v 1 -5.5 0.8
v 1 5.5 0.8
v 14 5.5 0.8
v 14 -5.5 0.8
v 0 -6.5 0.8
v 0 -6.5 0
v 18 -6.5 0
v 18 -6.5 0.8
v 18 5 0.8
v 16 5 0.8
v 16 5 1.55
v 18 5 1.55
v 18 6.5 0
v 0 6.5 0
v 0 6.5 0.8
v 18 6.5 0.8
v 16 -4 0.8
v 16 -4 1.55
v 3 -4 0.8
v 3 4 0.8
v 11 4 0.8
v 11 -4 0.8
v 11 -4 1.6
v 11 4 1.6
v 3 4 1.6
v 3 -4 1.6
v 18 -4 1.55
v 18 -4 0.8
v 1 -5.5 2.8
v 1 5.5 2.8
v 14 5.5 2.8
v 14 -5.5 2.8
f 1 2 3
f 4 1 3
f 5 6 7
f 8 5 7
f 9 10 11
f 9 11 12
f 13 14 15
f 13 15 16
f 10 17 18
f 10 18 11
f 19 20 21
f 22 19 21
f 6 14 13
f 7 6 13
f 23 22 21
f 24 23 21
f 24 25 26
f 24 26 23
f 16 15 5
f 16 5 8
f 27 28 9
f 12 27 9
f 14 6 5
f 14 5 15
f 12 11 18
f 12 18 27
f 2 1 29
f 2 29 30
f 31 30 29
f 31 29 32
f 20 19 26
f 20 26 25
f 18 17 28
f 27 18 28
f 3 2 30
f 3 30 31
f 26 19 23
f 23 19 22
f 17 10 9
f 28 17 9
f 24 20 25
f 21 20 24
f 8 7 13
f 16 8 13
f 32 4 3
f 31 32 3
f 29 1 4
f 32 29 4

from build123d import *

# Parameters (mm, degrees)
BOX_W        = 18
BOX_H        = 13
BOX_DEPTH    = 0.8
BOX001_W     = 13
BOX001_H     = 11
BOX001_DEPTH = 2
BOX002_W     = 2
BOX002_H     = 9
BOX002_DEPTH = 0.75
BOX003_W     = 8
BOX003_H     = 8
BOX003_DEPTH = 0.8


with BuildPart() as pcb:
    # Box → Box (new body)
    with BuildSketch(Plane(origin=(0, -6.5, 0), x_dir=(1, 0, 0), z_dir=(0, 0, 1))):
        with Locations((9, 6.5)):
            Rectangle(BOX_W, BOX_H)
    extrude(amount=BOX_DEPTH)


with BuildPart() as shield:
    # Box001 → Box001 (new body)
    with BuildSketch(Plane(origin=(1, -5.5, 0.8), x_dir=(1, 0, 0), z_dir=(0, 0, 1))):
        with Locations((6.5, 5.5)):
            Rectangle(BOX001_W, BOX001_H)
    extrude(amount=BOX001_DEPTH)


with BuildPart() as antenna:
    # Box002 → Box002 (new body)
    with BuildSketch(Plane(origin=(16, -4, 0.8), x_dir=(1, 0, 0), z_dir=(0, 0, 1))):
        with Locations((1, 4.5)):
            Rectangle(BOX002_W, BOX002_H)
    extrude(amount=BOX002_DEPTH)


with BuildPart() as mcu:
    # Box003 → Box003 (new body)
    with BuildSketch(Plane(origin=(3, -4, 0.8), x_dir=(1, 0, 0), z_dir=(0, 0, 1))):
        with Locations((4, 4)):
            Rectangle(BOX003_W, BOX003_H)
    extrude(amount=BOX003_DEPTH)


solid = Compound([pcb.part, shield.part, antenna.part, mcu.part])
